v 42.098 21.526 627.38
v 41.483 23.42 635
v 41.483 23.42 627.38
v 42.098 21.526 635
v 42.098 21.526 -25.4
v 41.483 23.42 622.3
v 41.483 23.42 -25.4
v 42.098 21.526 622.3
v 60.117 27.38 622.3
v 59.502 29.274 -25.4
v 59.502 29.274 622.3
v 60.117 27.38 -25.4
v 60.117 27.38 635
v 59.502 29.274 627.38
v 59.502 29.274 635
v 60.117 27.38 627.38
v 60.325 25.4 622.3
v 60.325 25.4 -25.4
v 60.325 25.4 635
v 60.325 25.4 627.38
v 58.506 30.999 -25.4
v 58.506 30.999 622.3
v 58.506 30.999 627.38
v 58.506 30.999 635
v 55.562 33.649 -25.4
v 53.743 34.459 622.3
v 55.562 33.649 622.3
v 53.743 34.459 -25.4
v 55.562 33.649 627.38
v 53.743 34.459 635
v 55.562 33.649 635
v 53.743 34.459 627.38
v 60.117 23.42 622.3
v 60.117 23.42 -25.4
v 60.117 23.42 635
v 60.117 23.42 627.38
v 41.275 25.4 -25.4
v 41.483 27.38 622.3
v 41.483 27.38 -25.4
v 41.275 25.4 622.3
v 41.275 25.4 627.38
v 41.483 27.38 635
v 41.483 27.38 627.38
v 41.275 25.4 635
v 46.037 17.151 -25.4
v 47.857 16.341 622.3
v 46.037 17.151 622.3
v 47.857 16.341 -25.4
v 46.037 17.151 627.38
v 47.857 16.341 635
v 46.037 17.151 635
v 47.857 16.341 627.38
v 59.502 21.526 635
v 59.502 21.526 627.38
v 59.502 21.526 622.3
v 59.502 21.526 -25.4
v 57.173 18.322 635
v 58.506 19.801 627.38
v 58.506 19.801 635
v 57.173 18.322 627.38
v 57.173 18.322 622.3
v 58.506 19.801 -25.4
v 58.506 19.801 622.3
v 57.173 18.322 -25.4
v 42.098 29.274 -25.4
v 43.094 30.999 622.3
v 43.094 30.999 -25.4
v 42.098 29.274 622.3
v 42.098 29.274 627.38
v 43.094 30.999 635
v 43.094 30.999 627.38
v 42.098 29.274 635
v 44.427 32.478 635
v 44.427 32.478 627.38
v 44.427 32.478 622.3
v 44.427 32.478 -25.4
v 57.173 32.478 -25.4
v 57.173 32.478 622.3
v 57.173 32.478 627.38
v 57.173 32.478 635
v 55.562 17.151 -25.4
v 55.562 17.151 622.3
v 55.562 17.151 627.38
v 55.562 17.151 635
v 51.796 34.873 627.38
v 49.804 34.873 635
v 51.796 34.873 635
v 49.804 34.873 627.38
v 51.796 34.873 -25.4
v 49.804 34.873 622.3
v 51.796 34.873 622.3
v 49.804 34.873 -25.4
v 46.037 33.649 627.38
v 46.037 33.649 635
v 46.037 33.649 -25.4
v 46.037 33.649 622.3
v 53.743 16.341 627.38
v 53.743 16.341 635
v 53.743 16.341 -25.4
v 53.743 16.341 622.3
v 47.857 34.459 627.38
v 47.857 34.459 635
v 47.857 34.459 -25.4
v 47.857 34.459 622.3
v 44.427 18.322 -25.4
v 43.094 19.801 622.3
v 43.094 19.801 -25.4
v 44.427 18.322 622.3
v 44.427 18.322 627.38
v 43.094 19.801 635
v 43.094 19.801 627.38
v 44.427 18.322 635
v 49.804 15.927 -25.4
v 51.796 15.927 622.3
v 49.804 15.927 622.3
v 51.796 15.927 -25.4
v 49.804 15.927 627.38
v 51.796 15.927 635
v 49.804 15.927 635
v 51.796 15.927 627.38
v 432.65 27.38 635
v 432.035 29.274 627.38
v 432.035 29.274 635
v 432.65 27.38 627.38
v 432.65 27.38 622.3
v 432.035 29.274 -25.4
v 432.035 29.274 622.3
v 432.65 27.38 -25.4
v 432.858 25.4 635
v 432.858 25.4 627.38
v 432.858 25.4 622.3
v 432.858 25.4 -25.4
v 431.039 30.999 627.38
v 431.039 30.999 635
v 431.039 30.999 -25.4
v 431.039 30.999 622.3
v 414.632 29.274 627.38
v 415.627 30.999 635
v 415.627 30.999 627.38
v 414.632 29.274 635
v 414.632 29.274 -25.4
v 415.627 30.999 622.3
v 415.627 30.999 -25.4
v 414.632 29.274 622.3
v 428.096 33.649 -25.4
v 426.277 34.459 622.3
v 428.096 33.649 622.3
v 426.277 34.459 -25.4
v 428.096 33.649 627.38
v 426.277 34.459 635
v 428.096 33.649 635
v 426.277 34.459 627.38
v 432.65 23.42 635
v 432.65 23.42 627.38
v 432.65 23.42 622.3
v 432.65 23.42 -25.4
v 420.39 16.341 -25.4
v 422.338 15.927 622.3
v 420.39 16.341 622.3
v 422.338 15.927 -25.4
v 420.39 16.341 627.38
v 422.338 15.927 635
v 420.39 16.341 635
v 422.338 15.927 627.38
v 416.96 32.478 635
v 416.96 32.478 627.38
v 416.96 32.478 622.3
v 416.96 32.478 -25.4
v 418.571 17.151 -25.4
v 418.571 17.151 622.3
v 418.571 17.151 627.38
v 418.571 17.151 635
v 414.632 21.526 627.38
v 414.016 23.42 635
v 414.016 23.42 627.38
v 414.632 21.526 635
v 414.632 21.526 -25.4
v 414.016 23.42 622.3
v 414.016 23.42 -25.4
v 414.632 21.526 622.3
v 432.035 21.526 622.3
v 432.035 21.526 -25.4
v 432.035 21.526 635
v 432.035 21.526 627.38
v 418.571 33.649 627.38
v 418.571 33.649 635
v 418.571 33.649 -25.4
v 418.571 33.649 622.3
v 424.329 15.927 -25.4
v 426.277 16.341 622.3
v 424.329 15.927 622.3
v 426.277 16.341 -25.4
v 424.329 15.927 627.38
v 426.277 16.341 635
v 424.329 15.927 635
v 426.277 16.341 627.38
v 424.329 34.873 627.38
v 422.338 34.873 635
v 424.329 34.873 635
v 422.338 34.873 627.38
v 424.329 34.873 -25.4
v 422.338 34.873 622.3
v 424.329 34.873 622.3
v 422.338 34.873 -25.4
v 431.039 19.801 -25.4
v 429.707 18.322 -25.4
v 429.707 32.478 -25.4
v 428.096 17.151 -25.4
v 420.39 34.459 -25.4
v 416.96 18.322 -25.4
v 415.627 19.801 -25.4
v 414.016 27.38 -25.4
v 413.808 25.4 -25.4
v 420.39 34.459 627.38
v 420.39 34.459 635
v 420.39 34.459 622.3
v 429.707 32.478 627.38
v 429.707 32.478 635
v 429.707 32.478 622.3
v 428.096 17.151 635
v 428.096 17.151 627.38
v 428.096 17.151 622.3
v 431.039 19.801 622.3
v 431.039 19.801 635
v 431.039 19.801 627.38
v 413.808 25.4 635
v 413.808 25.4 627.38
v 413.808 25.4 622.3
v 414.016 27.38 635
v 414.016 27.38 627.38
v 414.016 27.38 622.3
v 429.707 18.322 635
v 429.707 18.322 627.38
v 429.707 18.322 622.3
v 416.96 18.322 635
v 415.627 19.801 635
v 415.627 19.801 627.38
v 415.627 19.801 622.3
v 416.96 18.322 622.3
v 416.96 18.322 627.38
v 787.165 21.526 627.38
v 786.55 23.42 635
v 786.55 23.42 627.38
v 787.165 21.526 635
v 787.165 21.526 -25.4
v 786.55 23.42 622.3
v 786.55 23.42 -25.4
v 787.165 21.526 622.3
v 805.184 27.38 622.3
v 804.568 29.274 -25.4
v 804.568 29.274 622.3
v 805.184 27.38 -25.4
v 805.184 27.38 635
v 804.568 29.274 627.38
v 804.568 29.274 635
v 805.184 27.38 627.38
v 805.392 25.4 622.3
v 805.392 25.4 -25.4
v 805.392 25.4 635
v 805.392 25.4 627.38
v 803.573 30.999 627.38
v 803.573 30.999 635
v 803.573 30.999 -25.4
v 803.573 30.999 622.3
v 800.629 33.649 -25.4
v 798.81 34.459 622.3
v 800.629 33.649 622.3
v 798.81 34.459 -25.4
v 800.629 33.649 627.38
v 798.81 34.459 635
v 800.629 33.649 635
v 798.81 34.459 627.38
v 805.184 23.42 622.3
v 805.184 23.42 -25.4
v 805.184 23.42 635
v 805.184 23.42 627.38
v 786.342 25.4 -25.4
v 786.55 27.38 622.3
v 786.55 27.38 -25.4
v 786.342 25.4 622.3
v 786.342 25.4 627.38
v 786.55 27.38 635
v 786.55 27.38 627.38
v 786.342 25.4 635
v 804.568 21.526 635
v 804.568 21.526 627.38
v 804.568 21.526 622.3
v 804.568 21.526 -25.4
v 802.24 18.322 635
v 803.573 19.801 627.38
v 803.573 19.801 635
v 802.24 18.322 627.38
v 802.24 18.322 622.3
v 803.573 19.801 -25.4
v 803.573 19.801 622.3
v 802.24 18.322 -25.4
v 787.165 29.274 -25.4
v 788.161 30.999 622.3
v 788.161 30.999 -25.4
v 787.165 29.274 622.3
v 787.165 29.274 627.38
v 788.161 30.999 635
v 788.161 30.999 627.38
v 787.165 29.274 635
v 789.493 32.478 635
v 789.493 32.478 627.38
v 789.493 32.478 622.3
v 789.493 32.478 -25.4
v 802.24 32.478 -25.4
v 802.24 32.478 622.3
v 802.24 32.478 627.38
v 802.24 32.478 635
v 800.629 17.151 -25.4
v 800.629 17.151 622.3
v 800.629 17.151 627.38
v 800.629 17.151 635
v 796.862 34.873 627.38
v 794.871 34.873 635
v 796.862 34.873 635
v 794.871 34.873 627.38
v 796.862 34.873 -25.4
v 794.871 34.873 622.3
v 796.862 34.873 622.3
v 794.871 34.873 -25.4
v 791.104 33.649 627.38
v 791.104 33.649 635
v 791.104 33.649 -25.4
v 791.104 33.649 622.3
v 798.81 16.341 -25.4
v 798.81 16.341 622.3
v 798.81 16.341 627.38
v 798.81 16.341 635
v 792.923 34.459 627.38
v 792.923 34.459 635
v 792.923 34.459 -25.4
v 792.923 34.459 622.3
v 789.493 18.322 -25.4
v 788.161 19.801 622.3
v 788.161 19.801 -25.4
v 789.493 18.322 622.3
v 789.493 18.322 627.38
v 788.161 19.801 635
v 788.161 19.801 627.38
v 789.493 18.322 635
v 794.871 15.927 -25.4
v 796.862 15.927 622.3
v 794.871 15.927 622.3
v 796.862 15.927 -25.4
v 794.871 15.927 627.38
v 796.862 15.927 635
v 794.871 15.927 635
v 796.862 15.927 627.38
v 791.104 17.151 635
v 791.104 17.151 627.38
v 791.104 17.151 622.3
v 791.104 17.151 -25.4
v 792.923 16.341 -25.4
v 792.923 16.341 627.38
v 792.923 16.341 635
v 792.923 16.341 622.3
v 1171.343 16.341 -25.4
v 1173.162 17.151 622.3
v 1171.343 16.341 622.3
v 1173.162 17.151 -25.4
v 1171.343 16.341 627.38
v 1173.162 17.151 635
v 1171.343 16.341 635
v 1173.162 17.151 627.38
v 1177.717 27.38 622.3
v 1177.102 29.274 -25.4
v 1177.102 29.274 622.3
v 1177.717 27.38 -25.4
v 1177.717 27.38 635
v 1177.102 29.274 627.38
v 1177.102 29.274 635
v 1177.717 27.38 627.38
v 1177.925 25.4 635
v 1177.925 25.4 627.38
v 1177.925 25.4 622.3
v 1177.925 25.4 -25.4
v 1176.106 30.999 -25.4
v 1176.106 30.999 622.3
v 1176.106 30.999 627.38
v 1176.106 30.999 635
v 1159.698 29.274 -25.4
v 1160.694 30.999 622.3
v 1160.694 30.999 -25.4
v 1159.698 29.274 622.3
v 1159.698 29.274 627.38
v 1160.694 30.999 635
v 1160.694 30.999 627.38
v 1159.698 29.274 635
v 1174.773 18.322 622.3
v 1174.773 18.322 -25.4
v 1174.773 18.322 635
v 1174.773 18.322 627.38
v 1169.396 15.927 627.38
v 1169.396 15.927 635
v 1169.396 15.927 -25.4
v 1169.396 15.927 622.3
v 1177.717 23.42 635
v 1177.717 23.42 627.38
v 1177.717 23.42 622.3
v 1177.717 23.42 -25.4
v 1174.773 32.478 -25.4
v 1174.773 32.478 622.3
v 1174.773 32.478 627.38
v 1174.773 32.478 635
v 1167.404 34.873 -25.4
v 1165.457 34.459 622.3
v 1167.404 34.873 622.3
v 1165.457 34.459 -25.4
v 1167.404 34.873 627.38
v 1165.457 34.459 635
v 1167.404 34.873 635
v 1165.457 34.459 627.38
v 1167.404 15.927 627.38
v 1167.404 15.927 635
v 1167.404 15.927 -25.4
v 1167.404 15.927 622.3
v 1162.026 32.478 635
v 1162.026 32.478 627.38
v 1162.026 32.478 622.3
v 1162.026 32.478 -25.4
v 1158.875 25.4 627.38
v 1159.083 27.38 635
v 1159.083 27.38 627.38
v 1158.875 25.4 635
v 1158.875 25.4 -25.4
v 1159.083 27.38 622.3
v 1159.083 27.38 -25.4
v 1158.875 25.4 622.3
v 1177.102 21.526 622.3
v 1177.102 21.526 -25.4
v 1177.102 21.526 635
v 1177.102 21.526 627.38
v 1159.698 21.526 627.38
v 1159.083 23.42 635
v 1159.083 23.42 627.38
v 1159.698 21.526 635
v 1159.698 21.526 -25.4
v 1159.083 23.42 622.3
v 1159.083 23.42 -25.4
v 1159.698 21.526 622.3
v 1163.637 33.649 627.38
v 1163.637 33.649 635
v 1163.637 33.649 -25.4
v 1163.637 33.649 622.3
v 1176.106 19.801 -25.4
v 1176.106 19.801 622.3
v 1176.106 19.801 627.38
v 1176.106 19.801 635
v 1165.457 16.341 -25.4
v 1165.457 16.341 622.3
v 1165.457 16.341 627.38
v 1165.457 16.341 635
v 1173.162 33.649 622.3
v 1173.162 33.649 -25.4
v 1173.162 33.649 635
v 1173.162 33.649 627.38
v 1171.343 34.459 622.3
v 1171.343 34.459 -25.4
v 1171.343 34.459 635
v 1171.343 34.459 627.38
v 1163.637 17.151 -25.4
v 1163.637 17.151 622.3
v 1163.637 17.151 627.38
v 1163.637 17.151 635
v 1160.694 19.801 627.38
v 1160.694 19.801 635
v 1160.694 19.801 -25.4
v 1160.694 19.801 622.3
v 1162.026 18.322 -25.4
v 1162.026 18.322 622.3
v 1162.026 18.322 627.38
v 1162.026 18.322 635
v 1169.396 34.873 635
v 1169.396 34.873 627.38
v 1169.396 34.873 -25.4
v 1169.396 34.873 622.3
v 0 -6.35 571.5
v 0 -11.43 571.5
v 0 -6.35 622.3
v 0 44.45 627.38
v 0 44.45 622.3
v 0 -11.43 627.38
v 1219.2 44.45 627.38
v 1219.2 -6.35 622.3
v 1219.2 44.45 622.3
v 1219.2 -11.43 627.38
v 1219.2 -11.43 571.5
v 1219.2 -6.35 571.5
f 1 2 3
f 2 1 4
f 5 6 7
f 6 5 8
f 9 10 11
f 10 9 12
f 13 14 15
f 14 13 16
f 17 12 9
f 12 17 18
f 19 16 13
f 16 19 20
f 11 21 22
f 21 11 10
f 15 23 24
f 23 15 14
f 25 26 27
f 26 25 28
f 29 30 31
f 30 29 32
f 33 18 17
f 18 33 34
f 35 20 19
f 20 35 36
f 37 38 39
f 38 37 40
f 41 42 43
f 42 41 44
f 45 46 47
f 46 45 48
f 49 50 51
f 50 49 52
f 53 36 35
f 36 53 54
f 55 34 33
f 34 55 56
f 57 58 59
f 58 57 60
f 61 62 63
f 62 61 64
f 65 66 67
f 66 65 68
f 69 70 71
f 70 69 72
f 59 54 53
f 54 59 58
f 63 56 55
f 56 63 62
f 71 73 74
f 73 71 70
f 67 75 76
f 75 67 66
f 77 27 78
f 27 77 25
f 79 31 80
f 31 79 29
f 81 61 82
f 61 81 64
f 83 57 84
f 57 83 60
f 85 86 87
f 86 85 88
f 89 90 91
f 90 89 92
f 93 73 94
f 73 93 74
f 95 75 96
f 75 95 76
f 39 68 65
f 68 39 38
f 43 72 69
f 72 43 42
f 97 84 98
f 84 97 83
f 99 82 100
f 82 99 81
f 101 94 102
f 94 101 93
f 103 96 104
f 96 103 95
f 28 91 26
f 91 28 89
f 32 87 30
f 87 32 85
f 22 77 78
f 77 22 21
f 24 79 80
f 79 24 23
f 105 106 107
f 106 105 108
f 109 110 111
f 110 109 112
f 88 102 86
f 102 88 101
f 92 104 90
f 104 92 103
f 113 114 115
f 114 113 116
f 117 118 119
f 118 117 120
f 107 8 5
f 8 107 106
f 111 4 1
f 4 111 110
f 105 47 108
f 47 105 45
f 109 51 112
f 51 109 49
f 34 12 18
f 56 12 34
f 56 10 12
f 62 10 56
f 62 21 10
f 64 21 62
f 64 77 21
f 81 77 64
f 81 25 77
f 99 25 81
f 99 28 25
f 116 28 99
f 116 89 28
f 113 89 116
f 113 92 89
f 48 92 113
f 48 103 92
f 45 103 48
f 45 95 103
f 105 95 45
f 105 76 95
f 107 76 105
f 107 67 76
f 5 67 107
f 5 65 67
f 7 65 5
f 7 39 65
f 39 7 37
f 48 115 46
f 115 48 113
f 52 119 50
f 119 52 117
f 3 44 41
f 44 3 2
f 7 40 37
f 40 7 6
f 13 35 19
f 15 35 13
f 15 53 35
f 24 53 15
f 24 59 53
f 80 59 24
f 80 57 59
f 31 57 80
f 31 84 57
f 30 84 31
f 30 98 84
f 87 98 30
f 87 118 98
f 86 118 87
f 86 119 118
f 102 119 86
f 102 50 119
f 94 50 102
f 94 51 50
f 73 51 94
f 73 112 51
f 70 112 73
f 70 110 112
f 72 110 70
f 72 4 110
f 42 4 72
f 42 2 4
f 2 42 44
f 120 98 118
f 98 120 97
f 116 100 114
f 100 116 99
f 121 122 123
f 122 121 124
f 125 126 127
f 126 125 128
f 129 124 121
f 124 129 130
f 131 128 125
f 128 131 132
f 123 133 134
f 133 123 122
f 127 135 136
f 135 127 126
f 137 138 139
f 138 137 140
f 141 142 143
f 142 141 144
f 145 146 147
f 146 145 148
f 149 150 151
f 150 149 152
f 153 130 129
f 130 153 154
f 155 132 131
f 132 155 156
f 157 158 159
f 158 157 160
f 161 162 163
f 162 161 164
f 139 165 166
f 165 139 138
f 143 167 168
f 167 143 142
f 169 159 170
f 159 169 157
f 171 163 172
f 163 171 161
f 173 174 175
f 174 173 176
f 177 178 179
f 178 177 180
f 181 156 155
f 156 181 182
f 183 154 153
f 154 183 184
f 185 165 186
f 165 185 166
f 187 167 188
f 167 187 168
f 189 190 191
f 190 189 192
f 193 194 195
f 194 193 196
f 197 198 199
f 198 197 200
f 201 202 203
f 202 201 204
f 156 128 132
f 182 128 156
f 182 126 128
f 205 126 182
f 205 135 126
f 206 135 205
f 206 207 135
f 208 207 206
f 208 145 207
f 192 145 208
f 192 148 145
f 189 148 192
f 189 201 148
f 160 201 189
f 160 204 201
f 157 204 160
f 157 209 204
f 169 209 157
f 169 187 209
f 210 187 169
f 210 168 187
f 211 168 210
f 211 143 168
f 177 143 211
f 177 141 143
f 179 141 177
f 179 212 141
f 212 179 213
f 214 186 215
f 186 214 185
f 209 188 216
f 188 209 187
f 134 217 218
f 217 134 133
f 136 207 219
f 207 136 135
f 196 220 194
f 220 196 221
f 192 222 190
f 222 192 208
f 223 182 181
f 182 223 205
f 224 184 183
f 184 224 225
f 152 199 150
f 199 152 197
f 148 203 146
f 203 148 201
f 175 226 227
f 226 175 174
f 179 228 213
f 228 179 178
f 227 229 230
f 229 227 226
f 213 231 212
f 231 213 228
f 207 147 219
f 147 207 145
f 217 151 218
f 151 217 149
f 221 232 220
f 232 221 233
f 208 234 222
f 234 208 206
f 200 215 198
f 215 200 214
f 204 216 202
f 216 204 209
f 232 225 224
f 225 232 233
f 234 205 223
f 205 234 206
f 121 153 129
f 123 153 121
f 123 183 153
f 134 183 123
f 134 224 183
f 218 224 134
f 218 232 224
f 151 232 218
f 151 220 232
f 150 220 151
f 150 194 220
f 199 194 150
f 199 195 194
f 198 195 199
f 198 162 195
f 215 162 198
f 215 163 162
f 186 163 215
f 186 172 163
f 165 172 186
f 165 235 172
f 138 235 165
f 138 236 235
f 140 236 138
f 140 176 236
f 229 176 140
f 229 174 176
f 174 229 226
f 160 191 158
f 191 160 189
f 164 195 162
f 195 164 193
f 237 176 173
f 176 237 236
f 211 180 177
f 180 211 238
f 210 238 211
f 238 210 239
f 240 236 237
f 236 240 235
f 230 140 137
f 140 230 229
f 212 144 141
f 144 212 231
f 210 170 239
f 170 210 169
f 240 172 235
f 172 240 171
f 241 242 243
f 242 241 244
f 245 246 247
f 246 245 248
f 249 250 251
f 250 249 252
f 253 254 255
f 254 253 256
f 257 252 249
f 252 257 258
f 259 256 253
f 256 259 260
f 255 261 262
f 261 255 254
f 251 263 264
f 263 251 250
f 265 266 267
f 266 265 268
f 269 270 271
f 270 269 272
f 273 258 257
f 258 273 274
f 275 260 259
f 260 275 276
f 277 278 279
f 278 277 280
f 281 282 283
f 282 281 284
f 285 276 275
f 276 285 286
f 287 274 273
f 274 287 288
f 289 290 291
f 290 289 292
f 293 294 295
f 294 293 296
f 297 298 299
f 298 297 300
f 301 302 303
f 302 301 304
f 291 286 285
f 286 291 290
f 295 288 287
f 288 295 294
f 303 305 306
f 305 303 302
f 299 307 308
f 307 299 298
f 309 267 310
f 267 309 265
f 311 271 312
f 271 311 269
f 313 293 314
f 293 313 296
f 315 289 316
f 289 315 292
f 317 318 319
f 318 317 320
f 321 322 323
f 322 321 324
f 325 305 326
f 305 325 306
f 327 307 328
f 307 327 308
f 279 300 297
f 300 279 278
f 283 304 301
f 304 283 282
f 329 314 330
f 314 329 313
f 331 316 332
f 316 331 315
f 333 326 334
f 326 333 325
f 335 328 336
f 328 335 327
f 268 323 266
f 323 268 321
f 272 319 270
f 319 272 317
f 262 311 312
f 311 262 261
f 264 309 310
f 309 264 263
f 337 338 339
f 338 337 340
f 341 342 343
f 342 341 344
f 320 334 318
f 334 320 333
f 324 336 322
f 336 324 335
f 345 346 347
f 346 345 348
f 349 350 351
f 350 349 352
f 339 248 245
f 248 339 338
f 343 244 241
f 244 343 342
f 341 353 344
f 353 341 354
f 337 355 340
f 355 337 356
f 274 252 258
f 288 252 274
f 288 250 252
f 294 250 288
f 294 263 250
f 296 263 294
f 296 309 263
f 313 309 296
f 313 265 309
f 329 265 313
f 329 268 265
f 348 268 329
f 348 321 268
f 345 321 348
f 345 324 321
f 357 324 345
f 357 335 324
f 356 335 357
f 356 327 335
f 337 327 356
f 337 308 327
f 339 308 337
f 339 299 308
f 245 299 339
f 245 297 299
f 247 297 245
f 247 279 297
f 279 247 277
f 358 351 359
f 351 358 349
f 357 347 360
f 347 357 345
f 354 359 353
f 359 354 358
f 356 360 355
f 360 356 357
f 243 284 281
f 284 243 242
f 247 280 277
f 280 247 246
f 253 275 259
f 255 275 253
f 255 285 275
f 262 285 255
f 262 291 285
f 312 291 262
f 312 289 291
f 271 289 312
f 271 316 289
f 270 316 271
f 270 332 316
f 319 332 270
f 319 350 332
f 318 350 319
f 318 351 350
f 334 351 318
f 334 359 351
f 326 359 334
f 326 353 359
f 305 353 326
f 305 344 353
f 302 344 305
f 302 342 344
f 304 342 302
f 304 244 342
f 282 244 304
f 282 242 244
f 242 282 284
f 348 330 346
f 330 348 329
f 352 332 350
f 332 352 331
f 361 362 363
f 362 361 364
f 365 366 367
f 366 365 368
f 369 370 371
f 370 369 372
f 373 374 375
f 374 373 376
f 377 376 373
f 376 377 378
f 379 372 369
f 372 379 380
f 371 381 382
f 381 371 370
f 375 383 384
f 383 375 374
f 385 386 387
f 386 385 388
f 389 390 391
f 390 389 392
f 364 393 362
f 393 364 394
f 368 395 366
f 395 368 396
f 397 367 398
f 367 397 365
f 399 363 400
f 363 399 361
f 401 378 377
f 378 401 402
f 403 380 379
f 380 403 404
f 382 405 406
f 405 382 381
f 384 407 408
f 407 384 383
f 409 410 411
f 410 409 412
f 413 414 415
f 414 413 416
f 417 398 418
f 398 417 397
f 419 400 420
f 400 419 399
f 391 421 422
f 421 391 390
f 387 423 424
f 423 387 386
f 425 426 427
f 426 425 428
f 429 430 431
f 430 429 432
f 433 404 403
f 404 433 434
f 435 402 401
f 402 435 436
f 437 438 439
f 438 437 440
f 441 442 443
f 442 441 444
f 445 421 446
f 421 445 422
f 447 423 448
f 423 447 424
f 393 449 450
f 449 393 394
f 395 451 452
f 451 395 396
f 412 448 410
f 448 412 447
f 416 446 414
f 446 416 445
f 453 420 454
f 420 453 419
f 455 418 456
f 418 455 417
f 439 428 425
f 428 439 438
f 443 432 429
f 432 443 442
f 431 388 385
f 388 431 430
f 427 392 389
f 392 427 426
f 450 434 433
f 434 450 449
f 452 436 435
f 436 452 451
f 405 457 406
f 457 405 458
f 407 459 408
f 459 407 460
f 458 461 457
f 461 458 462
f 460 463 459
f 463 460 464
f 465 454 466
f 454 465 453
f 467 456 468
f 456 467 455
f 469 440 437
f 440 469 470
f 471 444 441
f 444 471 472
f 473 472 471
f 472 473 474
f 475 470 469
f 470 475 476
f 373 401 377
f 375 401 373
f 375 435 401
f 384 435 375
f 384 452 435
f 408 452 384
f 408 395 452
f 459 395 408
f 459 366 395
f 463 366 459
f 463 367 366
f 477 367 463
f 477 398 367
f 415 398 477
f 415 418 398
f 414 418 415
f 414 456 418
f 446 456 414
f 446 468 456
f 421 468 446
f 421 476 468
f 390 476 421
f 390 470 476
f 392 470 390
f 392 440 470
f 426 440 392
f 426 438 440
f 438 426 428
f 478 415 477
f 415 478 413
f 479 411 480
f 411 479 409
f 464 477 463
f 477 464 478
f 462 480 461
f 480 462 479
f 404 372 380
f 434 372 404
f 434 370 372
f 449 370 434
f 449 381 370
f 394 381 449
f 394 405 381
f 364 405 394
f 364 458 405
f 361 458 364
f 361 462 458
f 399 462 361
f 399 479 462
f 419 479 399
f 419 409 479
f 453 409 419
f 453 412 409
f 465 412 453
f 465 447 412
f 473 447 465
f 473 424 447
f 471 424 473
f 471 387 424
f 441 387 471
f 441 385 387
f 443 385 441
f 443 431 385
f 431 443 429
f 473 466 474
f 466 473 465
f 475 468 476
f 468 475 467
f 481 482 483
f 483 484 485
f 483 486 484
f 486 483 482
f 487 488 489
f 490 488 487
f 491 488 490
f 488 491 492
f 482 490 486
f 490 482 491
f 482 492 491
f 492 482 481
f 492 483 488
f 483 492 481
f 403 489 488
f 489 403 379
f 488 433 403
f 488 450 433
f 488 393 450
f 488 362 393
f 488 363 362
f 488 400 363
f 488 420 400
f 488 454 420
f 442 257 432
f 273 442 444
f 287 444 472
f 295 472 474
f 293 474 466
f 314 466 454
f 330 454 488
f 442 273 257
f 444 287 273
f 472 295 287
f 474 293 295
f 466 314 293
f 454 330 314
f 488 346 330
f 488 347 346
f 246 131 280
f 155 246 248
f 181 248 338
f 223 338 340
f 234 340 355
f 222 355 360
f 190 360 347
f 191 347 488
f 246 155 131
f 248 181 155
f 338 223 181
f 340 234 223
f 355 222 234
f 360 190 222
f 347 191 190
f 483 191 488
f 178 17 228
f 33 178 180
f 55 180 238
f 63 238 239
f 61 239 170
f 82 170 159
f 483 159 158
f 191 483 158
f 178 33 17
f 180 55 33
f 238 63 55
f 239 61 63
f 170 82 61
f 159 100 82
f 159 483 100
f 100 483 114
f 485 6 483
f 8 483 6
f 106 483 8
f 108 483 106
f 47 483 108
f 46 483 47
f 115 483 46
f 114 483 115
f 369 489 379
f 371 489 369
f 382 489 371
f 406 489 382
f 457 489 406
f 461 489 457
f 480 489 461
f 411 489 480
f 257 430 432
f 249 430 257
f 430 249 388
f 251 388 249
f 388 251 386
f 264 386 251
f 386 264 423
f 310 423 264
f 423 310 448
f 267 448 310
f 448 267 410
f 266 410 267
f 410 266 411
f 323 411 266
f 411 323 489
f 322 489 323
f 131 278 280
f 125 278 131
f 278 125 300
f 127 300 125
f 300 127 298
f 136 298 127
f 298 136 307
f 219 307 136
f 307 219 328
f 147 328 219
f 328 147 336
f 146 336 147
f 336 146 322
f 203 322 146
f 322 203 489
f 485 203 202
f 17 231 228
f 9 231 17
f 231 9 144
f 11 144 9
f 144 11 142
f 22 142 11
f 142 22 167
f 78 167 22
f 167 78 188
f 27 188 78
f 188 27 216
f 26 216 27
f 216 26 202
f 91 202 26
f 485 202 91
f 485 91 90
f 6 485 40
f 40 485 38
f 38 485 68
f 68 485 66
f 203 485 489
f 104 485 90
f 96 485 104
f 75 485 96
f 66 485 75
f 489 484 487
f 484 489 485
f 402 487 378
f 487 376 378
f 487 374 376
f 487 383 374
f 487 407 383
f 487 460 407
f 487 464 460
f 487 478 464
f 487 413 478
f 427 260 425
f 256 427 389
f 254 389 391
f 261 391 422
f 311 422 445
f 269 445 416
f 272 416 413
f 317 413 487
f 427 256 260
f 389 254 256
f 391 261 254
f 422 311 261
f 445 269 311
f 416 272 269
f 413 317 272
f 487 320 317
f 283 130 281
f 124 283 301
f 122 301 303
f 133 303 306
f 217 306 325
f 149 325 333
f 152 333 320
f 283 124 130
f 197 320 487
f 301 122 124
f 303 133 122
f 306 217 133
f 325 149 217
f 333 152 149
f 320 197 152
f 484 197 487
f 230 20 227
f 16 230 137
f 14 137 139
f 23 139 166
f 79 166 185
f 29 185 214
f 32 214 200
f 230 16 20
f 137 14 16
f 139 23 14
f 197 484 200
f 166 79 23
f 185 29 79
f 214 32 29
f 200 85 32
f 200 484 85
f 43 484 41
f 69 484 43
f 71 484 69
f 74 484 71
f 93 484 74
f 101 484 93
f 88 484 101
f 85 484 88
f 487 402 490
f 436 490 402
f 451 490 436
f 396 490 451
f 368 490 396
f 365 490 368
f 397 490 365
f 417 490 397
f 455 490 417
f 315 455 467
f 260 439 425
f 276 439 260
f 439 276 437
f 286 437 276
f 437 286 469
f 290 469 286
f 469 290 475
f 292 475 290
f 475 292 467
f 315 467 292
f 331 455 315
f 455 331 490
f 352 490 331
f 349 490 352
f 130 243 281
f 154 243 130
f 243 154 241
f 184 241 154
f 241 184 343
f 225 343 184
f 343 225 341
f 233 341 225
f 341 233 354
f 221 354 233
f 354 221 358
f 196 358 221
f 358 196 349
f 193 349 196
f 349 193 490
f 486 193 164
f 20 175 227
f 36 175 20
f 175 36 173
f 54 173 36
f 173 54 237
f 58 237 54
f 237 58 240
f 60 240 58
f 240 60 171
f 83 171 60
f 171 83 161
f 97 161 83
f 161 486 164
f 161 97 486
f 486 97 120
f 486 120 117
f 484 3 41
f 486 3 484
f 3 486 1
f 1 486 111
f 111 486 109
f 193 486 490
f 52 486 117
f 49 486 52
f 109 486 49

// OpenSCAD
for(i=[0:16]) {
    translate([0,0,25.4 * 1.5 * i])
linear_extrude(height=25.4 * 0.75, center=true)
import(file=str("outputs/slice_",i,".dxf"));
}

h=(25.4 * (1.5*17));
for(i=[0:3]) {
    x = 2 * 25.4 + (44  *25.4 / 3) * i;
translate([x,25.4,h/2 - 0.75*25.4])
cylinder(h=h+(0.5*25.4),r=(0.75*25.4/2), center=true);
}

translate([25.4*24,-25.4/4,h - 25.4])
rotate([-90,-90,-90])
linear_extrude(height=25.4*48,center=true)
scale([25.4*2,25.4*2,25.4*2])
polygon([[0,0],[-1,0],[-1,0.1],[0.1,0.1],[0.1,-1],[0,-1]]);
